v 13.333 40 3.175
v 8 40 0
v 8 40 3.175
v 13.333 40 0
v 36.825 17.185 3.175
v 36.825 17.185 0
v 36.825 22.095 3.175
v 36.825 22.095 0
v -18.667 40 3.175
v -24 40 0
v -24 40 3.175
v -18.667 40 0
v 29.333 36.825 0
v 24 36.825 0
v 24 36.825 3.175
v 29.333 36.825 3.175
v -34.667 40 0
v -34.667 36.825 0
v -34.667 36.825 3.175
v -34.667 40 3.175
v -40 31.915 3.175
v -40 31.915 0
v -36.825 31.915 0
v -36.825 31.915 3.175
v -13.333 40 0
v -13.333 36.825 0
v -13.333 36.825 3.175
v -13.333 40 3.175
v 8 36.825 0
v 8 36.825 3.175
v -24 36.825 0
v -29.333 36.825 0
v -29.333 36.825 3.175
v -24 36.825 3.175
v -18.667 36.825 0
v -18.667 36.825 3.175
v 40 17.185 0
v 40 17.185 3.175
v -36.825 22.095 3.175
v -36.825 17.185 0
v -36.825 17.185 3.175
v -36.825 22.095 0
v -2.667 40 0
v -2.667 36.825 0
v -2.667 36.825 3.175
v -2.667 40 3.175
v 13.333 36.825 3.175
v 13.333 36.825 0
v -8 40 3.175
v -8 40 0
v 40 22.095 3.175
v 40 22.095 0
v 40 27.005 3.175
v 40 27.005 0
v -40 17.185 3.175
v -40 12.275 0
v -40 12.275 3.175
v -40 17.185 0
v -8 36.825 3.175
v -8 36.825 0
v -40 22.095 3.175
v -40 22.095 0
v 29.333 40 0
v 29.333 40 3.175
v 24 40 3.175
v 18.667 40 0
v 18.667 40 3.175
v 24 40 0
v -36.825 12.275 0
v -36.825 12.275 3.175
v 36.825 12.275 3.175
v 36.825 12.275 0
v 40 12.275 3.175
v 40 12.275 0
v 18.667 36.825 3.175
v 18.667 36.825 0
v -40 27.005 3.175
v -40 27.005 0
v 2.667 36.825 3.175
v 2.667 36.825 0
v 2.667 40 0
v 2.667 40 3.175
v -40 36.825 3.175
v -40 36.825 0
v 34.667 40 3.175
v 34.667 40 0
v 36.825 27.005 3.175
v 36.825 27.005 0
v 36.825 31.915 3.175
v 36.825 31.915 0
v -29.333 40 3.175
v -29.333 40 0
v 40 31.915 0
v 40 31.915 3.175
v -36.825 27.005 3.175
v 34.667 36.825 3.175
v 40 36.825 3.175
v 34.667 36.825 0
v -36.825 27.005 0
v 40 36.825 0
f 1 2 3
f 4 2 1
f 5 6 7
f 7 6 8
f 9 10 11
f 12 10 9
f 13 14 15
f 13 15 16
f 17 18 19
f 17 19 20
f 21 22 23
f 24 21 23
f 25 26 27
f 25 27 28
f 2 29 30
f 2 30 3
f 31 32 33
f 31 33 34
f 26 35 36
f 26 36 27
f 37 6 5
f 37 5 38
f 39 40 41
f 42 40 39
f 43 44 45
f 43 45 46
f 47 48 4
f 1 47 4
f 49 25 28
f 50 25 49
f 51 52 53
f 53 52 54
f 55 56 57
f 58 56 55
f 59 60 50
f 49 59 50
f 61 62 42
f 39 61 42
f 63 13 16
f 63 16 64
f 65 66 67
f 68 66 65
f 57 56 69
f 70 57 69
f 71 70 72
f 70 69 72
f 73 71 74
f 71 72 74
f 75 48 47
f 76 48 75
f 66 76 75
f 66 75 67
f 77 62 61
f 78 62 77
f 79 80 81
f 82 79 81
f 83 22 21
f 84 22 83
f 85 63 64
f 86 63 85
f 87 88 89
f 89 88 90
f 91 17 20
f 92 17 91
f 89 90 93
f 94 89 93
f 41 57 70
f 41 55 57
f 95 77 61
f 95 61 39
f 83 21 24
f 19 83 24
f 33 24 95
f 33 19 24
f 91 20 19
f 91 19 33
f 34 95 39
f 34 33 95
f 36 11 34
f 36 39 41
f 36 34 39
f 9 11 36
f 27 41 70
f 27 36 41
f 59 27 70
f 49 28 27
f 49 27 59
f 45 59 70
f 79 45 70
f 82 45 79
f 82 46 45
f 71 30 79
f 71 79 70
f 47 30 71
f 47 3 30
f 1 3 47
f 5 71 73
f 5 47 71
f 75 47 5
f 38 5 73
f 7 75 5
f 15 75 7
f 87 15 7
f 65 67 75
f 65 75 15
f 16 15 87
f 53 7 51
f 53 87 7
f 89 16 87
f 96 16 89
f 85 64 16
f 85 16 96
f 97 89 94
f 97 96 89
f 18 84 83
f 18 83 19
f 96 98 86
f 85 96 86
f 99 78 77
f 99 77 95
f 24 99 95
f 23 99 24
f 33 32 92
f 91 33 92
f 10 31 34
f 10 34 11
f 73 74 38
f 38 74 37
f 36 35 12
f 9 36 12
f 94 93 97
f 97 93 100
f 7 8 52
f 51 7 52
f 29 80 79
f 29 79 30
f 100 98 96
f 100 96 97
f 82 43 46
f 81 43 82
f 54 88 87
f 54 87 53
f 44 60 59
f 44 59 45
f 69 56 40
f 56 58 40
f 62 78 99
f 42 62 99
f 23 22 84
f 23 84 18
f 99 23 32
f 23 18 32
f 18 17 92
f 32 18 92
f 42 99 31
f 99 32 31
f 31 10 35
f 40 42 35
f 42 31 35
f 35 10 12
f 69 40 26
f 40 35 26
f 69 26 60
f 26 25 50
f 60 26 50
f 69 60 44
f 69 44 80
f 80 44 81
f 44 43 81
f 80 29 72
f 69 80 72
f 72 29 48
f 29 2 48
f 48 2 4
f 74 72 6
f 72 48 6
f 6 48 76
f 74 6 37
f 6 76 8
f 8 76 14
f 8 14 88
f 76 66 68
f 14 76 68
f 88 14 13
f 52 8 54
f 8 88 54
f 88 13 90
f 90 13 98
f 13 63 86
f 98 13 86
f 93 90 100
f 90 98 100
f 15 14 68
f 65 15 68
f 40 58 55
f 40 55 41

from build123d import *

# Parameters (mm, degrees)
SKETCH1_W               = 80
SKETCH1_H               = 80
BOSS_EXTRUDE1_DEPTH     = 3.175
CUT_EXTRUDE2_DEPTH      = 57.657573413
CUT_EXTRUDE2_DEPTH_BACK = 57.657573413
SKETCH3_W               = 5.333333333
SKETCH3_H               = 3.175
SKETCH3_W_2             = 3.175
SKETCH3_H_2             = 4.91
SKETCH3_W_3             = 5.333333334
SKETCH4_W               = 80.351781832
SKETCH4_H               = 52.368780003
CUT_EXTRUDE3_DEPTH      = 57.657573413


with BuildPart() as part:
    # Sketch1 → Boss-Extrude1 (new body)
    with BuildSketch(Plane.XY):
        Rectangle(SKETCH1_W, SKETCH1_H)
    extrude(amount=BOSS_EXTRUDE1_DEPTH)

    # Sketch3 → Cut-Extrude2 (cut, two sides: drawn at the far end of the back side and taken through both)
    with BuildSketch(Plane.XY.offset(3.175).offset(-CUT_EXTRUDE2_DEPTH_BACK)):
        with Locations((-37.333333334, -38.4125)):
            Rectangle(SKETCH3_W, SKETCH3_H)
        with Locations((-26.666666666, -38.4125)):
            Rectangle(SKETCH3_W, SKETCH3_H)
        with Locations((-38.4125, -29.46)):
            Rectangle(SKETCH3_W_2, SKETCH3_H_2)
        with Locations((-16, -38.4125)):
            Rectangle(SKETCH3_W_3, SKETCH3_H)
        with Locations((-38.4125, -19.64)):
            Rectangle(SKETCH3_W_2, SKETCH3_H_2)
        with Locations((-5.333333334, -38.4125)):
            Rectangle(SKETCH3_W, SKETCH3_H)
        with Locations((-38.4125, -9.82)):
            Rectangle(SKETCH3_W_2, SKETCH3_H_2)
        with Locations((5.333333334, -38.4125)):
            Rectangle(SKETCH3_W, SKETCH3_H)
        with Locations((-38.4125, 0)):
            Rectangle(SKETCH3_W_2, SKETCH3_H_2)
        with Locations((16, -38.4125)):
            Rectangle(SKETCH3_W_3, SKETCH3_H)
        with Locations((-38.4125, 9.82)):
            Rectangle(SKETCH3_W_2, SKETCH3_H_2)
        with Locations((26.666666666, -38.4125)):
            Rectangle(SKETCH3_W, SKETCH3_H)
        with Locations((-38.4125, 19.64)):
            Rectangle(SKETCH3_W_2, SKETCH3_H_2)
        with Locations((37.333333334, -38.4125)):
            Rectangle(SKETCH3_W, SKETCH3_H)
        with Locations((-38.4125, 29.46)):
            Rectangle(SKETCH3_W_2, SKETCH3_H_2)
        with Locations((-37.333333334, 38.4125)):
            Rectangle(SKETCH3_W, SKETCH3_H)
        with Locations((38.4125, -29.46)):
            Rectangle(SKETCH3_W_2, SKETCH3_H_2)
        with Locations((38.4125, -19.64)):
            Rectangle(SKETCH3_W_2, SKETCH3_H_2)
        with Locations((-26.666666666, 38.4125)):
            Rectangle(SKETCH3_W, SKETCH3_H)
        with Locations((38.4125, -9.82)):
            Rectangle(SKETCH3_W_2, SKETCH3_H_2)
        with Locations((-16, 38.4125)):
            Rectangle(SKETCH3_W_3, SKETCH3_H)
        with Locations((38.4125, 0)):
            Rectangle(SKETCH3_W_2, SKETCH3_H_2)
        with Locations((-5.333333334, 38.4125)):
            Rectangle(SKETCH3_W, SKETCH3_H)
        with Locations((38.4125, 9.82)):
            Rectangle(SKETCH3_W_2, SKETCH3_H_2)
        with Locations((5.333333334, 38.4125)):
            Rectangle(SKETCH3_W, SKETCH3_H)
        with Locations((38.4125, 19.64)):
            Rectangle(SKETCH3_W_2, SKETCH3_H_2)
        with Locations((16, 38.4125)):
            Rectangle(SKETCH3_W_3, SKETCH3_H)
        with Locations((38.4125, 29.46)):
            Rectangle(SKETCH3_W_2, SKETCH3_H_2)
        with Locations((26.666666666, 38.4125)):
            Rectangle(SKETCH3_W, SKETCH3_H)
        with Locations((37.333333334, 38.4125)):
            Rectangle(SKETCH3_W, SKETCH3_H)
    extrude(amount=CUT_EXTRUDE2_DEPTH + CUT_EXTRUDE2_DEPTH_BACK, mode=Mode.SUBTRACT)

    # Sketch4 → Cut-Extrude3 (cut, through all)
    with BuildSketch(Plane.XY.offset(3.175)):
        with Locations((0.175890916, -13.909390002)):
            Rectangle(SKETCH4_W, SKETCH4_H)
    extrude(amount=-CUT_EXTRUDE3_DEPTH, mode=Mode.SUBTRACT)


solid = part.part
